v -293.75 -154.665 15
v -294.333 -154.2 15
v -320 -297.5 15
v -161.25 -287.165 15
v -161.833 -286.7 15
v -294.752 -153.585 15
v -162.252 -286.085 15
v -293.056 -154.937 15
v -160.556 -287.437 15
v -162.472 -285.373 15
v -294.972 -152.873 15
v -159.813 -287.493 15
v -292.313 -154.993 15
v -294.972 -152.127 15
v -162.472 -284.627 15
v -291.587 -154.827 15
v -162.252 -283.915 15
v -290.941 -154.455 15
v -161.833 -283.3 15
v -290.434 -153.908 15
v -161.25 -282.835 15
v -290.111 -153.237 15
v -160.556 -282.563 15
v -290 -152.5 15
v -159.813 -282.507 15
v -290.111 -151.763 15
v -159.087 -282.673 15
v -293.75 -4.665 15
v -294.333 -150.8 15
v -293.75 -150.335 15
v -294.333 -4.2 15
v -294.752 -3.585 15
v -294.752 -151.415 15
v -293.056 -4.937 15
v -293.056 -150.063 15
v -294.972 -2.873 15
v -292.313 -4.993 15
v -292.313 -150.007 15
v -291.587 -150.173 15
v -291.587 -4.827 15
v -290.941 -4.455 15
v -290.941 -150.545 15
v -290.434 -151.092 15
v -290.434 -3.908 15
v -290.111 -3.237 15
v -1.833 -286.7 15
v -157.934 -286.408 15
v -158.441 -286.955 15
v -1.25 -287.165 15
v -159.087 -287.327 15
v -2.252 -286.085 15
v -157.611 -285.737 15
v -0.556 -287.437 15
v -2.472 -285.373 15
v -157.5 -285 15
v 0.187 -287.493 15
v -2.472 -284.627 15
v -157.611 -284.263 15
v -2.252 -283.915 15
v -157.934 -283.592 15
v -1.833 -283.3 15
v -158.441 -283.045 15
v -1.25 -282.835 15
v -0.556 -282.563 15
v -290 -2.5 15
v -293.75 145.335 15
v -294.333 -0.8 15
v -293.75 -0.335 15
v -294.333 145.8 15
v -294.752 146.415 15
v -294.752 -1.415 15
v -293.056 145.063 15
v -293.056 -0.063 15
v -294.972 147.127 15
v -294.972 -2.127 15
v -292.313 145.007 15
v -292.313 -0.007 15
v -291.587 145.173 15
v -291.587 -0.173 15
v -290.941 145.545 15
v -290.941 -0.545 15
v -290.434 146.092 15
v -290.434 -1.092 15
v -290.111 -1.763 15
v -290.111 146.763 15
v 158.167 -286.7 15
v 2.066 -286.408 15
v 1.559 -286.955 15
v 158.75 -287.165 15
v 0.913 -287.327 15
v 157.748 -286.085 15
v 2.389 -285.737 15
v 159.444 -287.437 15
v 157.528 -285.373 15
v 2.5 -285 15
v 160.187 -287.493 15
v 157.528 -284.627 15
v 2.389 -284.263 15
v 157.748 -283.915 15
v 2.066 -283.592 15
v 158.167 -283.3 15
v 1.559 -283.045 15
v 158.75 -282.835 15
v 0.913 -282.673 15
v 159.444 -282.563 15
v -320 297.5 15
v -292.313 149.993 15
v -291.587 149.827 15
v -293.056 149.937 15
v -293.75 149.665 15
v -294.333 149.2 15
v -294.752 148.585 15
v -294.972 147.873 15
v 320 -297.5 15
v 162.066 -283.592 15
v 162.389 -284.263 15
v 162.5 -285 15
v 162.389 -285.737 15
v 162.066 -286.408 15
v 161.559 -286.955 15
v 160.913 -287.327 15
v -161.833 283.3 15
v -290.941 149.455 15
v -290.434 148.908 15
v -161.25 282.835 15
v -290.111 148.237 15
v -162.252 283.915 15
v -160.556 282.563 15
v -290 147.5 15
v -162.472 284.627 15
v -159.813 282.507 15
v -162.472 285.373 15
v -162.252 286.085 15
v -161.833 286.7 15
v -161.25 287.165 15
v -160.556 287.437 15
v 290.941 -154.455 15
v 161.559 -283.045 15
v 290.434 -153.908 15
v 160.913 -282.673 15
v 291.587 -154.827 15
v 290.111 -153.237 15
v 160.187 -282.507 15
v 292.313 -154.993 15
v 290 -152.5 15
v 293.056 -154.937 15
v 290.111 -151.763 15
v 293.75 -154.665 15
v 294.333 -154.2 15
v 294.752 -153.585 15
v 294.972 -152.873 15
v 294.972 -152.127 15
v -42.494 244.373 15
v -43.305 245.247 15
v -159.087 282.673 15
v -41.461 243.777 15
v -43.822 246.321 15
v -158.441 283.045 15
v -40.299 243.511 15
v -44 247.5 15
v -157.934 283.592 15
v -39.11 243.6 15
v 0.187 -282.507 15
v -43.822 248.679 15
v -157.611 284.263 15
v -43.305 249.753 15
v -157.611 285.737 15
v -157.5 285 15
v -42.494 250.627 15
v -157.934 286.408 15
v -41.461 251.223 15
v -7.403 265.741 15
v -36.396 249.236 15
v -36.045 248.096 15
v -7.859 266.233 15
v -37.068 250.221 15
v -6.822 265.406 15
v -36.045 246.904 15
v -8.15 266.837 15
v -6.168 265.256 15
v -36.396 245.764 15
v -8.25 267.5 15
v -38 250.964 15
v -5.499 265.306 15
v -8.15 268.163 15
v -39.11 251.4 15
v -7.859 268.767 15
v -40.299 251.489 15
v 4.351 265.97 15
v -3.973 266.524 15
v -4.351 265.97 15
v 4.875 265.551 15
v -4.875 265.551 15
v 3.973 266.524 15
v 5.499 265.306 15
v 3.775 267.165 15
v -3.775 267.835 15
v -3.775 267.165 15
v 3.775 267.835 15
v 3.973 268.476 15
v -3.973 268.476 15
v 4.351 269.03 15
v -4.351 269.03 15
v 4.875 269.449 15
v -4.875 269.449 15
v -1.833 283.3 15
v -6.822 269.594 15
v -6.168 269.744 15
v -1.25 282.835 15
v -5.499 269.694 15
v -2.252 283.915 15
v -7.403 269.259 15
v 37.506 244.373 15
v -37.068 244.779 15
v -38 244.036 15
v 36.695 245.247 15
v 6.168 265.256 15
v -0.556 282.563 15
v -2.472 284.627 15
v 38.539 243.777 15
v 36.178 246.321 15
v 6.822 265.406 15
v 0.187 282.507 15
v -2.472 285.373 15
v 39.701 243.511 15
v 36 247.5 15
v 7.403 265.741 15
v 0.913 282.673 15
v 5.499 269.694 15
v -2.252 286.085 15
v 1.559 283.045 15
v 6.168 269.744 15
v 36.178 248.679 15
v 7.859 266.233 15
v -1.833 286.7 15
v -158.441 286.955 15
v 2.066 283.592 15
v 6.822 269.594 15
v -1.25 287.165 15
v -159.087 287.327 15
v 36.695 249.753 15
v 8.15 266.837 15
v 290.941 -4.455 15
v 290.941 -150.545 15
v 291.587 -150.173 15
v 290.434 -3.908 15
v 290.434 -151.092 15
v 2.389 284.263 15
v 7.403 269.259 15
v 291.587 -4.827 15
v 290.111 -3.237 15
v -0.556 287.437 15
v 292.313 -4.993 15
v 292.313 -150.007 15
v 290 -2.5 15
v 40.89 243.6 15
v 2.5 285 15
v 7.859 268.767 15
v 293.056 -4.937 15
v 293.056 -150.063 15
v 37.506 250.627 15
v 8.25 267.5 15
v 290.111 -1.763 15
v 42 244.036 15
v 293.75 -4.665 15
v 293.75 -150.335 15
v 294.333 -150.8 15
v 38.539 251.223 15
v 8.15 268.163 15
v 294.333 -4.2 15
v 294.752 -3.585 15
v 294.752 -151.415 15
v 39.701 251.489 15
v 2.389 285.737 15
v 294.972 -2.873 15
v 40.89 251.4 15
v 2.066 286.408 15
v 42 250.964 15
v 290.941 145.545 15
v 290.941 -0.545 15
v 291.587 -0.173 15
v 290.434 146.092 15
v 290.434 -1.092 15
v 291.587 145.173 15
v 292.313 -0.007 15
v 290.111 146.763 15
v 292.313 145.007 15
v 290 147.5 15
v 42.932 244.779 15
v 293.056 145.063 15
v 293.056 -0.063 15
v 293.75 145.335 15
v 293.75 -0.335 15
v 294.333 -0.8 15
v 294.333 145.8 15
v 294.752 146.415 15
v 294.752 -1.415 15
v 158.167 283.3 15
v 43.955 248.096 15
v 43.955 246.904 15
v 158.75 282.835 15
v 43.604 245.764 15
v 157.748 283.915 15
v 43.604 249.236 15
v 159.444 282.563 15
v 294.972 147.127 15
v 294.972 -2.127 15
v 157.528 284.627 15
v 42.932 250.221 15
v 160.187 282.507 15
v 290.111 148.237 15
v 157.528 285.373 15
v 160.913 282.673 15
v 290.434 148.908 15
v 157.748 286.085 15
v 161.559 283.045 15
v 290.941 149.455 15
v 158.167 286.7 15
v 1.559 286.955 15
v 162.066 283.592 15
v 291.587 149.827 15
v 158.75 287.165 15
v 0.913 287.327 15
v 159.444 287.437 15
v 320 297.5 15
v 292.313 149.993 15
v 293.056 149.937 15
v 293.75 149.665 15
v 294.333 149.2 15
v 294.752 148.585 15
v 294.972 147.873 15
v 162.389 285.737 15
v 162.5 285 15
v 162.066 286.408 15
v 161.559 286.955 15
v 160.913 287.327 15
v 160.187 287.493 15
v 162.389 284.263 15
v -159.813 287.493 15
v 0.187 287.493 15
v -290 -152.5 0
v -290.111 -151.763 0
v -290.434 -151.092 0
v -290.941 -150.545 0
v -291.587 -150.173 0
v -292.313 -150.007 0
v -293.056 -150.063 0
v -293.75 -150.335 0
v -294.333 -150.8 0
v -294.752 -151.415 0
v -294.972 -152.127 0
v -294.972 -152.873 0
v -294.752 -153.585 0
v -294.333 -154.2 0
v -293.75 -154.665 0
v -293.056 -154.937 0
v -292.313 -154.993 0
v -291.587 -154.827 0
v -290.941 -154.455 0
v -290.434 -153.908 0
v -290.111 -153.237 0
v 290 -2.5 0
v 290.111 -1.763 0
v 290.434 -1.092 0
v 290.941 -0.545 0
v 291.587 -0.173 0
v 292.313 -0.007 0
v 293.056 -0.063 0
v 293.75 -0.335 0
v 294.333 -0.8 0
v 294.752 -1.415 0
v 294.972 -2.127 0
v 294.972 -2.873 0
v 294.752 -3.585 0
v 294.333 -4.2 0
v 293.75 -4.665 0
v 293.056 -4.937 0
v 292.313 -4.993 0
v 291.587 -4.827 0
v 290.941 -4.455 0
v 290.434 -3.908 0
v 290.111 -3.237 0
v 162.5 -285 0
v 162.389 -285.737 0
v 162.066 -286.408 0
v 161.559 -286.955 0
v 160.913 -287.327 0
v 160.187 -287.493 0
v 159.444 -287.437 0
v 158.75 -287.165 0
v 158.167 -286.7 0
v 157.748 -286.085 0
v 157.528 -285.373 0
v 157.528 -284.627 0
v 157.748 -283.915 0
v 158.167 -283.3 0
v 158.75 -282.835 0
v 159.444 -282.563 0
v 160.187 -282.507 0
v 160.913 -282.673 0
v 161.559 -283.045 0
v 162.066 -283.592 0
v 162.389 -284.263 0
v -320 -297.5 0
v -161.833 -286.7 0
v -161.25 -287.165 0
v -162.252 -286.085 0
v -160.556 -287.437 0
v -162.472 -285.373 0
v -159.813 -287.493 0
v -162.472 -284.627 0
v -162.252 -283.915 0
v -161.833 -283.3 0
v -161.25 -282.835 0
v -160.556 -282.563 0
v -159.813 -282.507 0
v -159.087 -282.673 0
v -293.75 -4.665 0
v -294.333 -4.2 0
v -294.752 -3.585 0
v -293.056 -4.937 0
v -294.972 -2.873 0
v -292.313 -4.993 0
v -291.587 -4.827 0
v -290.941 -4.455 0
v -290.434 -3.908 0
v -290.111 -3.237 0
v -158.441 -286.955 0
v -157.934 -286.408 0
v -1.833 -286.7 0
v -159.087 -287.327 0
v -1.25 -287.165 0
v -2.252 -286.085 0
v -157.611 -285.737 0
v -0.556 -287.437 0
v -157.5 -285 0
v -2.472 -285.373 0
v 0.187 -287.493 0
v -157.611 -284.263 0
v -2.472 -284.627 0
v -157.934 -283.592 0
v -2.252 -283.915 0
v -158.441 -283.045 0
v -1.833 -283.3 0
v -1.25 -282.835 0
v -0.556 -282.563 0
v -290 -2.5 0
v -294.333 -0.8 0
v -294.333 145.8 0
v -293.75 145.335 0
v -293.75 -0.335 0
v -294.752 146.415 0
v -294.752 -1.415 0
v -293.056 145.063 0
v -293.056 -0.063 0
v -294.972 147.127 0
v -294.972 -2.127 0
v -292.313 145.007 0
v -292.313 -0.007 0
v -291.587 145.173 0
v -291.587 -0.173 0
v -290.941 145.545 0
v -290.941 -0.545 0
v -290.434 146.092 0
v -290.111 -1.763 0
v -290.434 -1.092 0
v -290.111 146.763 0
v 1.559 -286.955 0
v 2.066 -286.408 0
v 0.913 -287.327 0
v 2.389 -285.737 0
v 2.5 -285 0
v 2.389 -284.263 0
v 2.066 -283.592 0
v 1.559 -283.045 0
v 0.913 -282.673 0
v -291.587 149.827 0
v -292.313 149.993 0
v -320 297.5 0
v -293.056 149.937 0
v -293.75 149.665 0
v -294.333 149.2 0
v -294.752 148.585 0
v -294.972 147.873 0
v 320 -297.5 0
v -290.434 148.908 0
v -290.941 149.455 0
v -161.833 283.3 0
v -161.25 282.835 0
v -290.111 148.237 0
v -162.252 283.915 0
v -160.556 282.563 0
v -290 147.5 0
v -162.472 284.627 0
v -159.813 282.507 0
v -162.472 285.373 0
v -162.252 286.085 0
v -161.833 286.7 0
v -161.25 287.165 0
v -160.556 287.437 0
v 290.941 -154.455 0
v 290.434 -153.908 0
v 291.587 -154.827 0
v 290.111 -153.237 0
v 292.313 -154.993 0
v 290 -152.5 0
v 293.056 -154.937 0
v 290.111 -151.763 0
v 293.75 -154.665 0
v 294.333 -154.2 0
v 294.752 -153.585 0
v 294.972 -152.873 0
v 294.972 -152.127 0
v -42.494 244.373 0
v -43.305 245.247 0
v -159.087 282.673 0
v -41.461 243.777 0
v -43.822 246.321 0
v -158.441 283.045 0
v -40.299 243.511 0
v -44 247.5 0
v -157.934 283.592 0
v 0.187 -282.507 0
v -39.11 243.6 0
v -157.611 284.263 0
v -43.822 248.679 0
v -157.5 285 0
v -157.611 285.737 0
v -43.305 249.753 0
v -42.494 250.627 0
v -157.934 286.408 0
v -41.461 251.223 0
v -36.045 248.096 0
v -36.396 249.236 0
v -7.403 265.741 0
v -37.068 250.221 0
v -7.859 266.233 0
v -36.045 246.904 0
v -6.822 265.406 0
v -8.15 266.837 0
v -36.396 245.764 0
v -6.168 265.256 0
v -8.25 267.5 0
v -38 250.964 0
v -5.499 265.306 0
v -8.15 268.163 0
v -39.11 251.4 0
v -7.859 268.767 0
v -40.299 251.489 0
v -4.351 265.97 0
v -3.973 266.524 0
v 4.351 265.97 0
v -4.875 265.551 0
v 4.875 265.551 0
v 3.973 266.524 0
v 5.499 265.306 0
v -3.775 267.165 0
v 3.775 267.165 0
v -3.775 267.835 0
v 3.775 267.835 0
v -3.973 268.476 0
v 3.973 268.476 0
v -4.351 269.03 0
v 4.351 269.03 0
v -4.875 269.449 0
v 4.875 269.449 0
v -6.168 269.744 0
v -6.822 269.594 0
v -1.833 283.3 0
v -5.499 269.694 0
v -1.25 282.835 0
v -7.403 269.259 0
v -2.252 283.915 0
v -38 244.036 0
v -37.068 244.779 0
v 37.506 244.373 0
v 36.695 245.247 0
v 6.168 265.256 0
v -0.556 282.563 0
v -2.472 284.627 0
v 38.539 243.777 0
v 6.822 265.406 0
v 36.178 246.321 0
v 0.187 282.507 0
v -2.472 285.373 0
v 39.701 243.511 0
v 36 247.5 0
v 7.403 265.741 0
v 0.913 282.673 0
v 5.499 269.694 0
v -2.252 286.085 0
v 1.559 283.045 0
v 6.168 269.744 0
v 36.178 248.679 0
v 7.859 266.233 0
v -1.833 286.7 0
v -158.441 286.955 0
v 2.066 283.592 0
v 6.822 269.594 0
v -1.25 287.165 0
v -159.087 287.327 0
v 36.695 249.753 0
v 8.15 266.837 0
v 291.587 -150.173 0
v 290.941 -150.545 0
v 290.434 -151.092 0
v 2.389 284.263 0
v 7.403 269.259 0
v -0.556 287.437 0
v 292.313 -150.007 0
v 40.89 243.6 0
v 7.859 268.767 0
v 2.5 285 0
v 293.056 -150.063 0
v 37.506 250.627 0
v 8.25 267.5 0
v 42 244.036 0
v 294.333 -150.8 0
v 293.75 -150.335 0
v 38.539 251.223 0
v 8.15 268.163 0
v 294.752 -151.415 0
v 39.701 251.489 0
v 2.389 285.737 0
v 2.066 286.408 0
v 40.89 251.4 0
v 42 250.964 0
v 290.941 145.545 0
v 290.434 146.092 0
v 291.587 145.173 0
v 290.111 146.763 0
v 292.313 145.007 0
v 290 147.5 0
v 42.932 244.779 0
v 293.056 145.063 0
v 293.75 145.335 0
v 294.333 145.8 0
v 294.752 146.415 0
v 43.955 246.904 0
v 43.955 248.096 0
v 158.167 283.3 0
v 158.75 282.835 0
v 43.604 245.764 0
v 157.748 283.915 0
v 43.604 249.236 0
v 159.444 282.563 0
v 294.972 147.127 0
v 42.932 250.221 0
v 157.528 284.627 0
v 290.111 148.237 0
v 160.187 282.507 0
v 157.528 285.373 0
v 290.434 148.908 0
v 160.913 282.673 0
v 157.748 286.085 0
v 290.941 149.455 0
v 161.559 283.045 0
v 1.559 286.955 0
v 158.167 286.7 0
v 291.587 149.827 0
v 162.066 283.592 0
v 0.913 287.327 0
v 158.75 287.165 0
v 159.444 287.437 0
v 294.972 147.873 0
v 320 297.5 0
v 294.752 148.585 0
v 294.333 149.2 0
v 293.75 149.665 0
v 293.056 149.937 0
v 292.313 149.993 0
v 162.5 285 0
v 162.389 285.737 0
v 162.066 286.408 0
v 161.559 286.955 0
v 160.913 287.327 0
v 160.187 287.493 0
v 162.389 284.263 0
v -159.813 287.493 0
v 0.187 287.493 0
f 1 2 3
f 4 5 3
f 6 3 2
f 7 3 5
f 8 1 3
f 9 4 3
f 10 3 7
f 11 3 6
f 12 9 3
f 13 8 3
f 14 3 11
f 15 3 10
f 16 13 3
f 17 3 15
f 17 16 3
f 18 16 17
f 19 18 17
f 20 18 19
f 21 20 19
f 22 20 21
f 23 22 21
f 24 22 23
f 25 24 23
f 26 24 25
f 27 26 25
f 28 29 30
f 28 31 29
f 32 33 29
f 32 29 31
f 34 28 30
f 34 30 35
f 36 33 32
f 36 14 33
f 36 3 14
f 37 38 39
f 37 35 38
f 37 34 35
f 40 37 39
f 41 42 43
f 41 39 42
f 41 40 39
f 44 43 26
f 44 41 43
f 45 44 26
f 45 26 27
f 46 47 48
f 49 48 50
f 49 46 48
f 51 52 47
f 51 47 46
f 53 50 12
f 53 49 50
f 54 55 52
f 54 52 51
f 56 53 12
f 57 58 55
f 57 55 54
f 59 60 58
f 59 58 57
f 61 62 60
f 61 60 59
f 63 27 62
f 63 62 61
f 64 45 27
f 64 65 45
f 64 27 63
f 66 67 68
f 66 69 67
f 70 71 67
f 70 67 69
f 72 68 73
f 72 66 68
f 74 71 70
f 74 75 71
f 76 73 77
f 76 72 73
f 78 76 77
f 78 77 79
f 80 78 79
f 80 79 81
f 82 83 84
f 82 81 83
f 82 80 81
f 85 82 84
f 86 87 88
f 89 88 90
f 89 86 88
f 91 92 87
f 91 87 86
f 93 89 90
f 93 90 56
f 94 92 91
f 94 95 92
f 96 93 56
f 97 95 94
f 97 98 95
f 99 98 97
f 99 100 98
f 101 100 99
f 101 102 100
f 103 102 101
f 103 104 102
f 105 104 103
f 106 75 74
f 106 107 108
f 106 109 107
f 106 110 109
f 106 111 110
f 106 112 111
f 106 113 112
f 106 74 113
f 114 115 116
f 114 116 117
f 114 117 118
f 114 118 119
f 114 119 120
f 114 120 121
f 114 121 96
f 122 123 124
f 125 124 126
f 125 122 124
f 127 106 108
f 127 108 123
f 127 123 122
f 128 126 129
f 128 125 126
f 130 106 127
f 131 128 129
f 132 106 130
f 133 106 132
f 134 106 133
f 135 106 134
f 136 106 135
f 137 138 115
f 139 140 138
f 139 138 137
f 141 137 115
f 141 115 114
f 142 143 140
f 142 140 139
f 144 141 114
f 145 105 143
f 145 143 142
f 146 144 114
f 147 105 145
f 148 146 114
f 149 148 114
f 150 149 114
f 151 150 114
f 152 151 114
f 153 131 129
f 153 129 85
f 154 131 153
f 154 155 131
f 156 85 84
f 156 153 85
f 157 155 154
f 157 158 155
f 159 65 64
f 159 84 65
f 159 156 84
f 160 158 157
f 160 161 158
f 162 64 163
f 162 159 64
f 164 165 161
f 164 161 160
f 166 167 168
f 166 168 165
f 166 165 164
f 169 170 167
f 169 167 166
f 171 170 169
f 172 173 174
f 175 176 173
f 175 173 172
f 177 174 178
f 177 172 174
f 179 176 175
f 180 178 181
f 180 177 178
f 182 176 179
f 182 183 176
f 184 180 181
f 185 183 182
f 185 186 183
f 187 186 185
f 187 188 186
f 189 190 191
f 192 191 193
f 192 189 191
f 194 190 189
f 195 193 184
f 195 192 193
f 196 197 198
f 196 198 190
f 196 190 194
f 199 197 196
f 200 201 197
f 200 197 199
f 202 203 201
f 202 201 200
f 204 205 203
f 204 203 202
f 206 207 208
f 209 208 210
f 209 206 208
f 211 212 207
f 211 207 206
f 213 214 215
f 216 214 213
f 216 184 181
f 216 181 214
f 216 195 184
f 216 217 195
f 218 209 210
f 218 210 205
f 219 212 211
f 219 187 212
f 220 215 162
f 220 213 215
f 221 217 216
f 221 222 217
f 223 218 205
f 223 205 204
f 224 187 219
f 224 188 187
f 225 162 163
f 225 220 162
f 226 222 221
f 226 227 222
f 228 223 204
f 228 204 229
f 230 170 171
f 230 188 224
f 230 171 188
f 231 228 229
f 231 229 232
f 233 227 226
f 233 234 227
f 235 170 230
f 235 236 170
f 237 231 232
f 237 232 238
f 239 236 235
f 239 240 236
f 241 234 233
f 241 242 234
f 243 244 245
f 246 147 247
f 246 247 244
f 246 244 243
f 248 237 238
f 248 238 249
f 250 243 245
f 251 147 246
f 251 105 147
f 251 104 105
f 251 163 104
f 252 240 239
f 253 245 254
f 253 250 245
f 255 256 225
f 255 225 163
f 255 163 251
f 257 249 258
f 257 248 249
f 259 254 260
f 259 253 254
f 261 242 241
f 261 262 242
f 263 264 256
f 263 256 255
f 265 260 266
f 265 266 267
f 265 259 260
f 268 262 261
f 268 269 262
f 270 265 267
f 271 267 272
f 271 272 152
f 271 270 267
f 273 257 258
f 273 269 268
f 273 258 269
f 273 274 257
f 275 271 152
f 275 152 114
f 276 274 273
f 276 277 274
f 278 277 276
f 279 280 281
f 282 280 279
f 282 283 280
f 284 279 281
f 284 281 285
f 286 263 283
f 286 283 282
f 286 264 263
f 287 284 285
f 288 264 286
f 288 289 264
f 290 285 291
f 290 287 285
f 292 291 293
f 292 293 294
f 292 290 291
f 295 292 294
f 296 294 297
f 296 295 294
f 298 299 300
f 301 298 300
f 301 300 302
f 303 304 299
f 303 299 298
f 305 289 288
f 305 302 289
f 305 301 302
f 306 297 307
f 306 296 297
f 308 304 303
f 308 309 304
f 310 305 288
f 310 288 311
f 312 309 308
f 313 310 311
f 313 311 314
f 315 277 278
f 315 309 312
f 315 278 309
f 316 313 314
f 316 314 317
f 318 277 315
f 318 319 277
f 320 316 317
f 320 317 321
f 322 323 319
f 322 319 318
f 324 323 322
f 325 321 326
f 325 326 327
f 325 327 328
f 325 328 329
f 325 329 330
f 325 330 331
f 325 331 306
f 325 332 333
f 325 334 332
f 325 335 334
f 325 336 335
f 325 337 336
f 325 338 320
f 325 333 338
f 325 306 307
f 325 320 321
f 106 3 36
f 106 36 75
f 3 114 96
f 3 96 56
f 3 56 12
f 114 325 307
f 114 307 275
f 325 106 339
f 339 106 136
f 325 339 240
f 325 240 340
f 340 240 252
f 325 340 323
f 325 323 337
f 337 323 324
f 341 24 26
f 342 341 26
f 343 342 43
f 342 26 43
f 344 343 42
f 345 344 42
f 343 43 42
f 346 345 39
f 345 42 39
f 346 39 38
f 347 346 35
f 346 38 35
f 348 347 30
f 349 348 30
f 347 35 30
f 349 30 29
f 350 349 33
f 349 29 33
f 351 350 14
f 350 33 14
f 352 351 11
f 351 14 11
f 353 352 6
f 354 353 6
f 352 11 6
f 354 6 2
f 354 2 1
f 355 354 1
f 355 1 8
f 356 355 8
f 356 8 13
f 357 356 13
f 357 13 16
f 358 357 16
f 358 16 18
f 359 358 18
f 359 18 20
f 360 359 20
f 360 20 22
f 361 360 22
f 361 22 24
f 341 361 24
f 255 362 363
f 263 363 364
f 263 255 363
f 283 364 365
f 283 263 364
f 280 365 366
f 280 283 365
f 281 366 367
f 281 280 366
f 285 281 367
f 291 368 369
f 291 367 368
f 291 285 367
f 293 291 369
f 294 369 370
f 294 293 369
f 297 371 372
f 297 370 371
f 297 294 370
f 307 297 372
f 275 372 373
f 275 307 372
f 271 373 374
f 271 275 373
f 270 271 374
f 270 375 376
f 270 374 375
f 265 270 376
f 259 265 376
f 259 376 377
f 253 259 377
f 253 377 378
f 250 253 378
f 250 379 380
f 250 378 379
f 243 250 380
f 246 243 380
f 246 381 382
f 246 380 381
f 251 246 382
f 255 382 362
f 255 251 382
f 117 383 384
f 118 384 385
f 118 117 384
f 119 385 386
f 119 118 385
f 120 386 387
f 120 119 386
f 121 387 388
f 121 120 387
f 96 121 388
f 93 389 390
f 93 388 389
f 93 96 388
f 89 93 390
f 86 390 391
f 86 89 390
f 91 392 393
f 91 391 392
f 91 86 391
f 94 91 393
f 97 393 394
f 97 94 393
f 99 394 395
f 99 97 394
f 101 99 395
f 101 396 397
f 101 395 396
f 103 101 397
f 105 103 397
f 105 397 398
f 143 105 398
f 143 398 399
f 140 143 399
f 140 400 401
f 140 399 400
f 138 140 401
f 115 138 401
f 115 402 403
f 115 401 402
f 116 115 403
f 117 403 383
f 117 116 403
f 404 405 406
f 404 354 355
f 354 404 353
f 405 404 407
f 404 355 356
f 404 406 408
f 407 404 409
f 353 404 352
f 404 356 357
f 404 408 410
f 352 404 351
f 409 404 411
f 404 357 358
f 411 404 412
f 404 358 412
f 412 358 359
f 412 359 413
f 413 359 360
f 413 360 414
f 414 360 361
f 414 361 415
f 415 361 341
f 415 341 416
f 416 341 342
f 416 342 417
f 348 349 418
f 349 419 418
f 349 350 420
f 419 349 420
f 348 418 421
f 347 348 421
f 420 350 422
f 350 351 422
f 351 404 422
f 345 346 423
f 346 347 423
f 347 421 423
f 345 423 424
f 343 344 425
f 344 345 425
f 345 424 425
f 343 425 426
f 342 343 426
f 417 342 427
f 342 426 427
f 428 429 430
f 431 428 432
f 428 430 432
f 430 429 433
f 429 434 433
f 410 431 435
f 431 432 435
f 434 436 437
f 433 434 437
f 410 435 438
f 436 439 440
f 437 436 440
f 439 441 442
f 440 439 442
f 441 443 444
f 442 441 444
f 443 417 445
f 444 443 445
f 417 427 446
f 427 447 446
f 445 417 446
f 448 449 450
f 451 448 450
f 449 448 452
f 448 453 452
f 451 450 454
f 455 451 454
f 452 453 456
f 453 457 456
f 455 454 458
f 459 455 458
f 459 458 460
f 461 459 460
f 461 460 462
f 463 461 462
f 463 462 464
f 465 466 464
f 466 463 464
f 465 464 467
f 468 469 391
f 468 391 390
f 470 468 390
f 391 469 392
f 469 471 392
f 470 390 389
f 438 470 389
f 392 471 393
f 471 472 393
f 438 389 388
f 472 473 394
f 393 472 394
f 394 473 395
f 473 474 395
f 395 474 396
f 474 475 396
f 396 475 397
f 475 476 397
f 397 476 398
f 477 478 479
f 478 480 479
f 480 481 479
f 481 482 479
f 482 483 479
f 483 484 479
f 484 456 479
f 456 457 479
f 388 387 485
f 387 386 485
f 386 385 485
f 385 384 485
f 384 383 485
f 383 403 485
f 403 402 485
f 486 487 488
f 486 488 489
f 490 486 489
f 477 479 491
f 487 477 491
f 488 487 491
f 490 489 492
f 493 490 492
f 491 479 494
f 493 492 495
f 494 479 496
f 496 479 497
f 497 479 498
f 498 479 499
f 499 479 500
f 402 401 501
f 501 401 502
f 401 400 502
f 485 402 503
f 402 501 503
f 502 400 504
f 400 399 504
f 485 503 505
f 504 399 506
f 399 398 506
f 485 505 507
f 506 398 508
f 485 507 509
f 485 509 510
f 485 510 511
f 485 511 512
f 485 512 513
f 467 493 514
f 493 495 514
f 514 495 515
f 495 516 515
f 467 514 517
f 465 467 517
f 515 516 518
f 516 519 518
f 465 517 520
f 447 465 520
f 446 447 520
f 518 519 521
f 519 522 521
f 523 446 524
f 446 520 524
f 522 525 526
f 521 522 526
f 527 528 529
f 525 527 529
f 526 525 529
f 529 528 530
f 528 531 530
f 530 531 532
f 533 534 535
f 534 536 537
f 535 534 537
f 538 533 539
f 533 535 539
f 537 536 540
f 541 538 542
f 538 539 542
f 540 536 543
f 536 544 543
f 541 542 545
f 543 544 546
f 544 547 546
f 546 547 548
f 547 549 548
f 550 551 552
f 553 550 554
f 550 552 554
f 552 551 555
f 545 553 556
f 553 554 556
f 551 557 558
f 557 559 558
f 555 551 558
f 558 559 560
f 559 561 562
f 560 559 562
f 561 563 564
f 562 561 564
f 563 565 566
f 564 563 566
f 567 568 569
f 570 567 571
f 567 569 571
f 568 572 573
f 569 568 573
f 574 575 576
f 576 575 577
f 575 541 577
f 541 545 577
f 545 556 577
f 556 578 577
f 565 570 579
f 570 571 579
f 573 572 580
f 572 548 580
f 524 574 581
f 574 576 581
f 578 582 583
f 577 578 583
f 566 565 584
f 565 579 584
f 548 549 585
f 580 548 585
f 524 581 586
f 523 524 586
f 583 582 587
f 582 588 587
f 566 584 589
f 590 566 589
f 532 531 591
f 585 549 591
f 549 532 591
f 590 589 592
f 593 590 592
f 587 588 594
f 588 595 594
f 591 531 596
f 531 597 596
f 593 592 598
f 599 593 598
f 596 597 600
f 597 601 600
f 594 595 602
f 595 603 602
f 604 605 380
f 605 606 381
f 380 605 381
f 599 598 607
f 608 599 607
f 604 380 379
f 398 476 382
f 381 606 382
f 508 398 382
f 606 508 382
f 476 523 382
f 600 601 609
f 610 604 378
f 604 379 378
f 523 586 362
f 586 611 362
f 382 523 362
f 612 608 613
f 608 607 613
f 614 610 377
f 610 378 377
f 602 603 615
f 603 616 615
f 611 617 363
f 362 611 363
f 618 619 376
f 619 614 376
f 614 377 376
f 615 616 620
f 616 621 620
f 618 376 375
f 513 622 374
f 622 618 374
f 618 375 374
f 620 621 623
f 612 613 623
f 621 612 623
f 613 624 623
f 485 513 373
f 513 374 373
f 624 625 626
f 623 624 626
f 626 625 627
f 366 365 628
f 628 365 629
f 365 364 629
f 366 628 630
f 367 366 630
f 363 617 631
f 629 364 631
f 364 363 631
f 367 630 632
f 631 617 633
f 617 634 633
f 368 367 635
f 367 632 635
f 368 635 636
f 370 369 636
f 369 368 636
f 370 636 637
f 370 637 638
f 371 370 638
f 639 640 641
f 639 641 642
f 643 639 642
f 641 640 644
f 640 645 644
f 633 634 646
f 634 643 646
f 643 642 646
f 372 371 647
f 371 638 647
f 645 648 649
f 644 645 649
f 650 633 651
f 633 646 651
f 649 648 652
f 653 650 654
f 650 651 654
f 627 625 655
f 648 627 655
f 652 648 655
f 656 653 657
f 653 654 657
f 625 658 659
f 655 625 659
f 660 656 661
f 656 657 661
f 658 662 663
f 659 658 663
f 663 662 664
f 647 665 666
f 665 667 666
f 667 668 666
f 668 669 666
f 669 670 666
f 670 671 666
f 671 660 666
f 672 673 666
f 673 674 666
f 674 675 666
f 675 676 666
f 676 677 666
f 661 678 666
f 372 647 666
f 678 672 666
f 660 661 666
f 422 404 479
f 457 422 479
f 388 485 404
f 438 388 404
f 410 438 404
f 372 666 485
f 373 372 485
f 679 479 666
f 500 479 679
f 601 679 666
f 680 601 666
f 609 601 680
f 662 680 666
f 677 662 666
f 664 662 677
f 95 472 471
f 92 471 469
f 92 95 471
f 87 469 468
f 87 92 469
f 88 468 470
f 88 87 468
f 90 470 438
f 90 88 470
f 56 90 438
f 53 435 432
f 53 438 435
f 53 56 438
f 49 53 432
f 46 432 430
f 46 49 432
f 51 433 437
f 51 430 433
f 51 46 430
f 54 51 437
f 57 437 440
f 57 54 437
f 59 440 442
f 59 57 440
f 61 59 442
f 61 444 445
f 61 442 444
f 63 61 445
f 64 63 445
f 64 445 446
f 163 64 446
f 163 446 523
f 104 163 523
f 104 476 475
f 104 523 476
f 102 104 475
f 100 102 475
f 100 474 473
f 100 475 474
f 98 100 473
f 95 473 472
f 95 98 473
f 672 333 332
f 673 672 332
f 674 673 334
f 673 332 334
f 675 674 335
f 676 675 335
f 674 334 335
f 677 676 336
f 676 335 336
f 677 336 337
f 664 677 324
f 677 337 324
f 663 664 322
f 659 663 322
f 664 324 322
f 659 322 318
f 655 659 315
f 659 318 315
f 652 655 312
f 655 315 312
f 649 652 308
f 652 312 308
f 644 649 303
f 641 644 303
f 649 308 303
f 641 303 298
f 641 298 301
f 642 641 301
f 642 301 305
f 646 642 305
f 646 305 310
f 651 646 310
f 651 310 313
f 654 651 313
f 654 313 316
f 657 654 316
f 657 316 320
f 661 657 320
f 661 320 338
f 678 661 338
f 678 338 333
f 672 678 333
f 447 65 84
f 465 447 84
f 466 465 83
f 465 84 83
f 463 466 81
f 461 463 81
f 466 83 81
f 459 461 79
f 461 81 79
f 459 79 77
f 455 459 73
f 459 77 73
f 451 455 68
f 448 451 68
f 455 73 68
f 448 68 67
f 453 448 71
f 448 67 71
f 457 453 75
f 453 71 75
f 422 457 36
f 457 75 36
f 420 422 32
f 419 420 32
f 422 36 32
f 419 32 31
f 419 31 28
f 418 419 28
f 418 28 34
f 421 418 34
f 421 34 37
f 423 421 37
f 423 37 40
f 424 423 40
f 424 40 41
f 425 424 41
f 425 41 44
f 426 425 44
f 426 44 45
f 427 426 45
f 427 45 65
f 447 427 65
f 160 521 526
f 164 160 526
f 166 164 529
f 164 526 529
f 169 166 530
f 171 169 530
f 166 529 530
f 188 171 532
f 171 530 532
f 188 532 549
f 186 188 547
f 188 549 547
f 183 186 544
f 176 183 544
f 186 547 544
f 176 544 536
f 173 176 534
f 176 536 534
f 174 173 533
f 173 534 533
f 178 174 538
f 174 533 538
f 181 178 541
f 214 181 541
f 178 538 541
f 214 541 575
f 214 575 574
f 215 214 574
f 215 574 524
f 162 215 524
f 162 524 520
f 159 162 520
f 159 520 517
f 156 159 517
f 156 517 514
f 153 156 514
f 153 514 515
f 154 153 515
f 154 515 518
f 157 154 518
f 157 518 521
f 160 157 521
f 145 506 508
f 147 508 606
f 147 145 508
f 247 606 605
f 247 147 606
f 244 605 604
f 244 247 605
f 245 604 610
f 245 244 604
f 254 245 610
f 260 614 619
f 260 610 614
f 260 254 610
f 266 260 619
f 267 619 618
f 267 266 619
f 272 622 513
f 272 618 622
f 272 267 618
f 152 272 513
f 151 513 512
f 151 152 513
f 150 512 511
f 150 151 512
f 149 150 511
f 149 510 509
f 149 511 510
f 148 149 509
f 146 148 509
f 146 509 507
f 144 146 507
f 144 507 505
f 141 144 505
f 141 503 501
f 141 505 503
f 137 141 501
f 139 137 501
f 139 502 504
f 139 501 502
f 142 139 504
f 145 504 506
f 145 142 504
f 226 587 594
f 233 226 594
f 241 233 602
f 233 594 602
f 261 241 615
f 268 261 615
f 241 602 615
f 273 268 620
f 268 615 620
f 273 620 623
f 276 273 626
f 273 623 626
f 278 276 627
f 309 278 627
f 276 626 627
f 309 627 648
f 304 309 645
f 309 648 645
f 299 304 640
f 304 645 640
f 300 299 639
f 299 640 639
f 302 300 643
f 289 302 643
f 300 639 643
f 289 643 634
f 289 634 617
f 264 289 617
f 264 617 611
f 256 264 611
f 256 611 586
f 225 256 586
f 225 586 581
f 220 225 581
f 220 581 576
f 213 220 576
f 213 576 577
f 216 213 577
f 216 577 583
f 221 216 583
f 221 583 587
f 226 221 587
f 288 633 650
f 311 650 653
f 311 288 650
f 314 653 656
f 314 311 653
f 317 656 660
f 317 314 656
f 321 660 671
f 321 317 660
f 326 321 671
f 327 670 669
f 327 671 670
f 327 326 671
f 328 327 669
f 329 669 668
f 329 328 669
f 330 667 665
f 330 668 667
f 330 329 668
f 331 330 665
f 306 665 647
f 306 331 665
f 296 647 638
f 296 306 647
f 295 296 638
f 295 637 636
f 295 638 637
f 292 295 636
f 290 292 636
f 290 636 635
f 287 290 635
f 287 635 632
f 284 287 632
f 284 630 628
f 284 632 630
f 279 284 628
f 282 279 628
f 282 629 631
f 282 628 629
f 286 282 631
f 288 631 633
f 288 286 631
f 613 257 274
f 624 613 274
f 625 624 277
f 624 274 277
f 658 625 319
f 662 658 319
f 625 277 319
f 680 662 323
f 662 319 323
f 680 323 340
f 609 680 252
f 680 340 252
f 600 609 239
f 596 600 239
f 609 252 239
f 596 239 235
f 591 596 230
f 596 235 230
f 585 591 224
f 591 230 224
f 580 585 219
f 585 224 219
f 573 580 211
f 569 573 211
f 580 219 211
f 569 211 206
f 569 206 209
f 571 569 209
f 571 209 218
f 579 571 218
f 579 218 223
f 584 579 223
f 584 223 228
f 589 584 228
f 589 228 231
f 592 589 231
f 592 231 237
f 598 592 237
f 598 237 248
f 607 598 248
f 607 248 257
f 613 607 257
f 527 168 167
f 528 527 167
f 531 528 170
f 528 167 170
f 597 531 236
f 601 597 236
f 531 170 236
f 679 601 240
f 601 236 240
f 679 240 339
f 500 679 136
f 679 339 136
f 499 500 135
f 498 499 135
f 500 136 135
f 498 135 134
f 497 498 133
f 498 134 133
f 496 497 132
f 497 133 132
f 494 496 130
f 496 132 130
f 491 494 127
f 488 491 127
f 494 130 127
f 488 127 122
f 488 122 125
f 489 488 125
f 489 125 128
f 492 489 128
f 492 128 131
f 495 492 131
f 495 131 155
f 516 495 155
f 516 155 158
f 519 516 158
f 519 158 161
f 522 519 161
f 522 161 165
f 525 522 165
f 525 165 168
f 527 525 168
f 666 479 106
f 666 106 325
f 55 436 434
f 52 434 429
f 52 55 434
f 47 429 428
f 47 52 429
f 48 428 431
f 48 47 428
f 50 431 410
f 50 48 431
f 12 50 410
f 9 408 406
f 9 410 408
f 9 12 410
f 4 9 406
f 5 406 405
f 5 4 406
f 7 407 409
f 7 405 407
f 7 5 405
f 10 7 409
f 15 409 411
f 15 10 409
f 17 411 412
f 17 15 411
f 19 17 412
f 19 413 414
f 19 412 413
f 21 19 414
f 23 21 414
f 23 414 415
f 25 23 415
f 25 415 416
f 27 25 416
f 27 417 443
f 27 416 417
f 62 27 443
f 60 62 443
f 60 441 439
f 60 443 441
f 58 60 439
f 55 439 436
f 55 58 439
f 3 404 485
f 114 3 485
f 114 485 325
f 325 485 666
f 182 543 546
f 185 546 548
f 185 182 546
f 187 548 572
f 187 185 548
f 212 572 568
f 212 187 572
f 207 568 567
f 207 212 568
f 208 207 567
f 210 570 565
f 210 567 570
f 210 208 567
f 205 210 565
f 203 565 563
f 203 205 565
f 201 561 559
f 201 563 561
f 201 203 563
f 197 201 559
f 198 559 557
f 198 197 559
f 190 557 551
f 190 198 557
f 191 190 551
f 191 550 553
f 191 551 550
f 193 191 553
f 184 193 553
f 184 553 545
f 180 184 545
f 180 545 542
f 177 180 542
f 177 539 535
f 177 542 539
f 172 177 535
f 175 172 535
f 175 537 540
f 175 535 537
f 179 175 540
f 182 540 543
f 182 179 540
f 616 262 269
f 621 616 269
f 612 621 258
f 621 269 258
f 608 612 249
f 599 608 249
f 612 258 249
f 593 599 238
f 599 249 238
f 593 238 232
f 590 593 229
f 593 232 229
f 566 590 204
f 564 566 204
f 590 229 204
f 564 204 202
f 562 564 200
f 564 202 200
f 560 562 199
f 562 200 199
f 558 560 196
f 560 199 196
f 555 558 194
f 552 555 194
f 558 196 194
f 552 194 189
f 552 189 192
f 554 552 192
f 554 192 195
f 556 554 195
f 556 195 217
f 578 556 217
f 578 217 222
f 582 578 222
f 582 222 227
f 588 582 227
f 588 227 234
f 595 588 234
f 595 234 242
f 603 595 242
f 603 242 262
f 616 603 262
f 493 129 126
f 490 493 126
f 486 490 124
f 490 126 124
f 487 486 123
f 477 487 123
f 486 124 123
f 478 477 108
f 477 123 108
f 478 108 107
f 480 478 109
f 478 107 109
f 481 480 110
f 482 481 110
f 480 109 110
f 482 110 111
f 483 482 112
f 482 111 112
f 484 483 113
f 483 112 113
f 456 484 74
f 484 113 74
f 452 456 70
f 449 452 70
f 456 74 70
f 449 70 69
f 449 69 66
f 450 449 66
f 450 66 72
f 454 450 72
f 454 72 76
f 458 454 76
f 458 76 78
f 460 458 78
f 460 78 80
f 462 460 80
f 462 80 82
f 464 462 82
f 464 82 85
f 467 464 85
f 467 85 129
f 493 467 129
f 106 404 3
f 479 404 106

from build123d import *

# Parameters (mm, degrees)
SKETCH_1_W          = 640
SKETCH_1_H          = 595
EXTRUDE_1_DEPTH     = 15
SKETCH_2_R          = 2.5
CUT_EXTRUDE_1_DEPTH = 438.185601318
SKETCH_2_3_R        = 2.5
CUT_EXTRUDE_2_DEPTH = 438.185601318
SKETCH_3_R          = 4
CUT_EXTRUDE_3_DEPTH = 438.185601318
SKETCH_4_R          = 2.25
CUT_EXTRUDE_4_DEPTH = 438.185601318


with BuildPart() as part:
    # ｽｹｯﾁ1 → ﾎﾞｽ - 押し出し1 (new body)
    with BuildSketch(Plane.XY):
        Rectangle(SKETCH_1_W, SKETCH_1_H)
    extrude(amount=EXTRUDE_1_DEPTH)

    # ｽｹｯﾁ2 → ｶｯﾄ - 押し出し1 (cut, through all)
    with BuildSketch(Plane.XY.offset(15)):
        with Locations((-160, 285)):
            Circle(SKETCH_2_R)
        with Locations((0, 285)):
            Circle(SKETCH_2_R)
        with Locations((160, 285)):
            Circle(SKETCH_2_R)
    cut_extrude_1 = extrude(amount=-CUT_EXTRUDE_1_DEPTH, mode=Mode.SUBTRACT)

    # ｽｹｯﾁ2<3> → ｶｯﾄ - 押し出し2 (cut, through all)
    with BuildSketch(Plane.XY.offset(15)):
        with Locations((-292.5, 147.5)):
            Circle(SKETCH_2_3_R)
        with Locations((-292.5, -2.5)):
            Circle(SKETCH_2_3_R)
        with Locations((-292.5, -152.5)):
            Circle(SKETCH_2_3_R)
    cut_extrude_2 = extrude(amount=-CUT_EXTRUDE_2_DEPTH, mode=Mode.SUBTRACT)

    # ﾐﾗｰ1: ｶｯﾄ - 押し出し1 across plane
    add(cut_extrude_1.mirror(Plane.ZX), mode=Mode.SUBTRACT)

    # ﾐﾗｰ2: ｶｯﾄ - 押し出し2 across plane
    add(cut_extrude_2.mirror(Plane(origin=(0, 0, 0), x_dir=(0, 0, 1), z_dir=(1, 0, 0))), mode=Mode.SUBTRACT)

    # ｽｹｯﾁ3 → ｶｯﾄ - 押し出し3 (cut, through all)
    with BuildSketch(Plane(origin=(0, 0, 0), x_dir=(-1, 0, 0), z_dir=(0, 0, -1))):
        with Locations((-40, 247.5)):
            Circle(SKETCH_3_R)
        with Locations((40, 247.5)):
            Circle(SKETCH_3_R)
    extrude(amount=-CUT_EXTRUDE_3_DEPTH, mode=Mode.SUBTRACT)

    # ｽｹｯﾁ4 → ｶｯﾄ - 押し出し4 (cut, through all)
    with BuildSketch(Plane.XY.offset(15)):
        with Locations((6, 267.5)):
            Circle(SKETCH_4_R)
    cut_extrude_4 = extrude(amount=-CUT_EXTRUDE_4_DEPTH, mode=Mode.SUBTRACT)

    # ﾐﾗｰ3: ｶｯﾄ - 押し出し4 across plane
    add(cut_extrude_4.mirror(Plane(origin=(0, 0, 0), x_dir=(0, 0, 1), z_dir=(1, 0, 0))), mode=Mode.SUBTRACT)


solid = part.part
